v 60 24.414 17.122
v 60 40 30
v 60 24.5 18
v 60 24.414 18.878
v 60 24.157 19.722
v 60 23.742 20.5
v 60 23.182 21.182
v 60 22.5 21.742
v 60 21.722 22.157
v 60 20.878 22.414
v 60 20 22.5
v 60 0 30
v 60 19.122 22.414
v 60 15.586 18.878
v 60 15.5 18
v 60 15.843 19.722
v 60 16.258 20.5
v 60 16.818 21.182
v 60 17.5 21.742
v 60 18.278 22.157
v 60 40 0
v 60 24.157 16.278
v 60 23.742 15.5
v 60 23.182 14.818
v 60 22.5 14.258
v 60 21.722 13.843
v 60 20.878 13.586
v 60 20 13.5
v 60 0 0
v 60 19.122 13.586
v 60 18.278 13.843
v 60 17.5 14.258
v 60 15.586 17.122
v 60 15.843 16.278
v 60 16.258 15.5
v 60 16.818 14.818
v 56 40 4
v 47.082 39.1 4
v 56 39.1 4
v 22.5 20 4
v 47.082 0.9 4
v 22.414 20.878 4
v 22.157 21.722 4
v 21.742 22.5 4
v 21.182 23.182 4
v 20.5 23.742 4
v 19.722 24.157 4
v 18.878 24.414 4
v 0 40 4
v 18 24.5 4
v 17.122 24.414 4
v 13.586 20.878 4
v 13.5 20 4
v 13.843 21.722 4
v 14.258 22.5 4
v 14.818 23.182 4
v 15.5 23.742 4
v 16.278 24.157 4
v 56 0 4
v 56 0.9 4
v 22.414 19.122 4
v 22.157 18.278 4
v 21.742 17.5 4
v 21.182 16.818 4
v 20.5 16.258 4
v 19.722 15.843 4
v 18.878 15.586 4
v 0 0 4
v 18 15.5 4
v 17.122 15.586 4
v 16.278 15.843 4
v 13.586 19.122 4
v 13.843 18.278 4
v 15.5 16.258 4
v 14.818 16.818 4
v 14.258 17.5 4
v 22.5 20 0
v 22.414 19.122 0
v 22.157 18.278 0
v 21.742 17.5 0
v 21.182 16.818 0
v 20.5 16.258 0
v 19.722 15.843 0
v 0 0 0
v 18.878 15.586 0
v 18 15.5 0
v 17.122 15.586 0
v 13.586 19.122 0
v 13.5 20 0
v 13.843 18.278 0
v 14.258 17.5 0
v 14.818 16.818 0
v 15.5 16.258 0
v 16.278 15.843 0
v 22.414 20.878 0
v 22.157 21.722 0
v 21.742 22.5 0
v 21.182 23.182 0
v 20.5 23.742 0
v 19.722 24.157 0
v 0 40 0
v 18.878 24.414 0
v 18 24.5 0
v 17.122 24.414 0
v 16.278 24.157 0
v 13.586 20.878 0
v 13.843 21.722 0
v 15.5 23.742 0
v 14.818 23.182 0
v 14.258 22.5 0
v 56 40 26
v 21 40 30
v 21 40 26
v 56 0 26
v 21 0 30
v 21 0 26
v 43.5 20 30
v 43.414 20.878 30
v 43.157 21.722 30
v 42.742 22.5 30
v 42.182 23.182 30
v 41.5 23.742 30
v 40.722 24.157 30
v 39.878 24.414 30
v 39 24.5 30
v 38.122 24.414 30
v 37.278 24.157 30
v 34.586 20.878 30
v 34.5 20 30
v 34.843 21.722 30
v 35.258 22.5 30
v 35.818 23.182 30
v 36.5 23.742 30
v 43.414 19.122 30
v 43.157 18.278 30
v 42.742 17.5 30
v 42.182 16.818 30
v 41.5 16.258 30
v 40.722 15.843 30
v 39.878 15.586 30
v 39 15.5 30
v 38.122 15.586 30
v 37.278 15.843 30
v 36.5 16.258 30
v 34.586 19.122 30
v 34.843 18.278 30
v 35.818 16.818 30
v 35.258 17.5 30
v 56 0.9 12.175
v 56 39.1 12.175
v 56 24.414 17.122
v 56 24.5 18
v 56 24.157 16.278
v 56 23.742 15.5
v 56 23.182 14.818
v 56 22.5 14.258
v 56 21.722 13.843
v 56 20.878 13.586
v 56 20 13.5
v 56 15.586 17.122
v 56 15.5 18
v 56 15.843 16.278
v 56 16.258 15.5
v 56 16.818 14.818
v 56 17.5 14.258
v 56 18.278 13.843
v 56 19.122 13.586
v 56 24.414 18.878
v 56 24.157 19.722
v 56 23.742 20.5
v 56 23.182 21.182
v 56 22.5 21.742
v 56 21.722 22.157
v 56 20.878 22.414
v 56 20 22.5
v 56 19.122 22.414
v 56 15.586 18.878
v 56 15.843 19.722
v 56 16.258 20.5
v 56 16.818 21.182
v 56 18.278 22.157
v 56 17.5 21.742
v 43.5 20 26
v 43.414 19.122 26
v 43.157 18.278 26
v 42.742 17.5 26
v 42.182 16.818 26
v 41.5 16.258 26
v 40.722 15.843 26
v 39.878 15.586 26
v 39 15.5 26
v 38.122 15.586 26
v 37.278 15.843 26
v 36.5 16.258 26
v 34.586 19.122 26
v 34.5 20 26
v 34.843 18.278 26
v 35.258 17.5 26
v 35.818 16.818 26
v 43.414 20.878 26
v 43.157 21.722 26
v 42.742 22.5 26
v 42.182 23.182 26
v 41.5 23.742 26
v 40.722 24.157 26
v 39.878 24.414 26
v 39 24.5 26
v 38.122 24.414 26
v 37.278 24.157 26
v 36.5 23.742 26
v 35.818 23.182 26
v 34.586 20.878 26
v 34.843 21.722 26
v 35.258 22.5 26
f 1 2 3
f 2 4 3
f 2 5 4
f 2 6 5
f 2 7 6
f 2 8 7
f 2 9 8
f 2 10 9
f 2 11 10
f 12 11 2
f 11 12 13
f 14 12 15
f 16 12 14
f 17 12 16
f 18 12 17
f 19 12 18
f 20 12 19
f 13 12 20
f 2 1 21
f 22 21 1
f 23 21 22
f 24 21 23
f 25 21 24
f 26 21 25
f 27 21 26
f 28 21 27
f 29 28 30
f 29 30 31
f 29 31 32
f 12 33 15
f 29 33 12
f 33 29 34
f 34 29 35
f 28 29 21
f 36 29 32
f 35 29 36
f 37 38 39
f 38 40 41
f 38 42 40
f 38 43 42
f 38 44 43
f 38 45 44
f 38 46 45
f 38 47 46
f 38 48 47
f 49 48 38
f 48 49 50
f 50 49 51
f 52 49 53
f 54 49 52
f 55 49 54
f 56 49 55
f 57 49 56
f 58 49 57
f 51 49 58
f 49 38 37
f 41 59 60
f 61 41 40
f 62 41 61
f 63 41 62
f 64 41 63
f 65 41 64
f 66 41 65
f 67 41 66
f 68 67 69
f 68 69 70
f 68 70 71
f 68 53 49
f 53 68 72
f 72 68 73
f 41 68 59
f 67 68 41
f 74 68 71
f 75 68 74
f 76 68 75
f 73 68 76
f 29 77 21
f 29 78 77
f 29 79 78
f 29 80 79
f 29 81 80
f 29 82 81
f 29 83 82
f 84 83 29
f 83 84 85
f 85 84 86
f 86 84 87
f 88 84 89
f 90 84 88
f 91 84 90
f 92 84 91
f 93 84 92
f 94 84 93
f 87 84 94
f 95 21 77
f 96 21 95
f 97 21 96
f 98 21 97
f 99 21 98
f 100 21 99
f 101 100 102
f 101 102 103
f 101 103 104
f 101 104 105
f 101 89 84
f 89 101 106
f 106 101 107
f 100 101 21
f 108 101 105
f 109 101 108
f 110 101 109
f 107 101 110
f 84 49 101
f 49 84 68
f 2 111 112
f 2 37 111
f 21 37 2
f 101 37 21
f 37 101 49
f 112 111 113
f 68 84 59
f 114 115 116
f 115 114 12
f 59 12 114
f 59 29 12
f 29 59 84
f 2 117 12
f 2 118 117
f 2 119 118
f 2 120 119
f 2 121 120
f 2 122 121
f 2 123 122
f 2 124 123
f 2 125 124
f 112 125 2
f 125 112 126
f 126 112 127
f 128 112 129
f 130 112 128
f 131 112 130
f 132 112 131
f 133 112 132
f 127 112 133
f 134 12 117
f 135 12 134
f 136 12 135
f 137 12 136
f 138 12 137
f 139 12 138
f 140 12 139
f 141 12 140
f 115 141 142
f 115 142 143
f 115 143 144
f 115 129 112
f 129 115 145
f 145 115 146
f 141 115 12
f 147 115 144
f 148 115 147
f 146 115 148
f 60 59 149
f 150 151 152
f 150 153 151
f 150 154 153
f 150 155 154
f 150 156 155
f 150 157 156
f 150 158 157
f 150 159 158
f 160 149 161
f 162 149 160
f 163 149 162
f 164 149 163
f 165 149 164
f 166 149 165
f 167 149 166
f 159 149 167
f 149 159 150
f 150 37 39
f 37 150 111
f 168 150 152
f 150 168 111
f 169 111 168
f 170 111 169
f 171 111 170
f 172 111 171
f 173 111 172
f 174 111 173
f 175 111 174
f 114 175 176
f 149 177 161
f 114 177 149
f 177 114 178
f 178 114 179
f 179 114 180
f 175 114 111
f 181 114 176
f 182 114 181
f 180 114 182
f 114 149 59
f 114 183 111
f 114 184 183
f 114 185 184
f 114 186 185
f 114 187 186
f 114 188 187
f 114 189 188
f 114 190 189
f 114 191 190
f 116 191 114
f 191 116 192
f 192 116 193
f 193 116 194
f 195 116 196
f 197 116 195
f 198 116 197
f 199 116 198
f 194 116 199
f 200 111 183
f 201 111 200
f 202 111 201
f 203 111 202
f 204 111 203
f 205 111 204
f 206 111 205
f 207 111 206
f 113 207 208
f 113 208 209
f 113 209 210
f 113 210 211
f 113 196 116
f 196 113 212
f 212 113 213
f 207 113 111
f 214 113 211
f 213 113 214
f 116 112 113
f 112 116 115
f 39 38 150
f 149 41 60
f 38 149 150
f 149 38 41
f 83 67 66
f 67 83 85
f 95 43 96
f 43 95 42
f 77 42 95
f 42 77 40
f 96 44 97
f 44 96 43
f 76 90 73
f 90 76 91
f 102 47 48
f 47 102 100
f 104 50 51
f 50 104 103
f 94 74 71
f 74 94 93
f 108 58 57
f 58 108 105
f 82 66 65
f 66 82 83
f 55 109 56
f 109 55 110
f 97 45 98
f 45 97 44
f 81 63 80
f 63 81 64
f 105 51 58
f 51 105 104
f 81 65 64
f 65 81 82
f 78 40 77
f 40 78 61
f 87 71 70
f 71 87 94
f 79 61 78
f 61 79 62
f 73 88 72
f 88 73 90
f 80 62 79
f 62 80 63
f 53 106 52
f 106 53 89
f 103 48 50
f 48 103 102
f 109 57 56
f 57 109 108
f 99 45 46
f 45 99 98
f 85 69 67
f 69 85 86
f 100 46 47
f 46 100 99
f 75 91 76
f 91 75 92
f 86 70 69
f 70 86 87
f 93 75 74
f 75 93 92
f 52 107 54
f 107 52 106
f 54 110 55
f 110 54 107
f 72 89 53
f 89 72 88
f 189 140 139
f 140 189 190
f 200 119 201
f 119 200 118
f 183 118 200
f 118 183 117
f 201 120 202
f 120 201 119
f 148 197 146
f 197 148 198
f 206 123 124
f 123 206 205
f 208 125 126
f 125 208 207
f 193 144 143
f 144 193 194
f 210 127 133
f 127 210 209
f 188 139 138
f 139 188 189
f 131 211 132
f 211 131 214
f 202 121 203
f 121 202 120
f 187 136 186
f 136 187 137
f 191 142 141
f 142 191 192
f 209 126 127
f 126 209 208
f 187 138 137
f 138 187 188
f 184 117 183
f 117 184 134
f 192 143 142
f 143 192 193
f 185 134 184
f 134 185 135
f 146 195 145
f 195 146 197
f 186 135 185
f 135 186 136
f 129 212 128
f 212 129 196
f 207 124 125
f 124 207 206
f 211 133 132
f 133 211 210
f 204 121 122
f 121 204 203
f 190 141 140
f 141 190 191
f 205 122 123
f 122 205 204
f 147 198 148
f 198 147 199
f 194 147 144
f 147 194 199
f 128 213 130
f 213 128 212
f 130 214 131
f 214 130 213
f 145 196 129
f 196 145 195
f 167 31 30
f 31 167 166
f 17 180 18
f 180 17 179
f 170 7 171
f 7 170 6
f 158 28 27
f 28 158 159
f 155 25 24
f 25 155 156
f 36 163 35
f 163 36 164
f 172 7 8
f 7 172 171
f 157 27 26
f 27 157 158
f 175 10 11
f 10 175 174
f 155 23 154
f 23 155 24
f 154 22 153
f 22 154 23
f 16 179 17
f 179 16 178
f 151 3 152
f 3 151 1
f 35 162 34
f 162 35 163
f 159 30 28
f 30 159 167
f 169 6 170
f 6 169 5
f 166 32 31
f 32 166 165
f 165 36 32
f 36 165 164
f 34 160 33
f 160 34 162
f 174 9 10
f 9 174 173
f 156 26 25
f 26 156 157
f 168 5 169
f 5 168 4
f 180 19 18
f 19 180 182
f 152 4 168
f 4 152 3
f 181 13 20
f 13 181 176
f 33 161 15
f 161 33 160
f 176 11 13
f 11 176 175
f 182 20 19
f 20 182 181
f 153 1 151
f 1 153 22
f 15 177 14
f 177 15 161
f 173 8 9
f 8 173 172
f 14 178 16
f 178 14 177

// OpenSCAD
$fn = 32;

// ----------------------------------------------------------------------
// Z-bracket: 60 x 40 x 30 mm
// ----------------------------------------------------------------------

// --- parameters (mm) ---
foot_len = 60;            // lower foot length, X
top_len = 35;             // upper foot length, X
depth = 40;               // bracket width, Y
step_h = 30;              // overall rise, Z
plate_t = 4;              // plate thickness
hole_d = 9;               // clearance for M8
rib_len = 9.9;            // gusset leg
rib_sink = 0.9;           // gusset overlap into the plates

module hole_z(px, py, z0) {
  translate([px, py, z0 - 0.5]) cylinder(h = plate_t + 1, d = hole_d);
}
module hole_x(py, pz) {
  translate([-0.5, py, pz]) rotate([0, 90, 0]) cylinder(h = plate_t + 1, d = hole_d);
}
module gusset(x0) {
  translate([x0, depth - rib_sink, 0])
    rotate([90, 0, 0])
      linear_extrude(height = depth - 2 * rib_sink)
        polygon(points = [[rib_sink, plate_t - rib_sink],
                          [rib_sink, plate_t - rib_sink + rib_len],
                          [-rib_len, plate_t - rib_sink]]);
}

difference() {
  union() {
    cube([foot_len, depth, plate_t]);
    /* web, overlapping the lower foot */
    translate([foot_len - plate_t, 0, 0]) cube([plate_t, depth, step_h]);
    /* upper foot, sunk into the web */
    translate([foot_len - plate_t - top_len, 0, step_h - plate_t]) cube([top_len + plate_t, depth, plate_t]);
    gusset(foot_len - plate_t);
  }
  hole_z(18, 20, 0);
  translate([foot_len - plate_t - 17, 0, 0]) hole_z(0, 20, step_h - plate_t);
  translate([foot_len - plate_t, 0, 0]) hole_x(20, 18);
}
